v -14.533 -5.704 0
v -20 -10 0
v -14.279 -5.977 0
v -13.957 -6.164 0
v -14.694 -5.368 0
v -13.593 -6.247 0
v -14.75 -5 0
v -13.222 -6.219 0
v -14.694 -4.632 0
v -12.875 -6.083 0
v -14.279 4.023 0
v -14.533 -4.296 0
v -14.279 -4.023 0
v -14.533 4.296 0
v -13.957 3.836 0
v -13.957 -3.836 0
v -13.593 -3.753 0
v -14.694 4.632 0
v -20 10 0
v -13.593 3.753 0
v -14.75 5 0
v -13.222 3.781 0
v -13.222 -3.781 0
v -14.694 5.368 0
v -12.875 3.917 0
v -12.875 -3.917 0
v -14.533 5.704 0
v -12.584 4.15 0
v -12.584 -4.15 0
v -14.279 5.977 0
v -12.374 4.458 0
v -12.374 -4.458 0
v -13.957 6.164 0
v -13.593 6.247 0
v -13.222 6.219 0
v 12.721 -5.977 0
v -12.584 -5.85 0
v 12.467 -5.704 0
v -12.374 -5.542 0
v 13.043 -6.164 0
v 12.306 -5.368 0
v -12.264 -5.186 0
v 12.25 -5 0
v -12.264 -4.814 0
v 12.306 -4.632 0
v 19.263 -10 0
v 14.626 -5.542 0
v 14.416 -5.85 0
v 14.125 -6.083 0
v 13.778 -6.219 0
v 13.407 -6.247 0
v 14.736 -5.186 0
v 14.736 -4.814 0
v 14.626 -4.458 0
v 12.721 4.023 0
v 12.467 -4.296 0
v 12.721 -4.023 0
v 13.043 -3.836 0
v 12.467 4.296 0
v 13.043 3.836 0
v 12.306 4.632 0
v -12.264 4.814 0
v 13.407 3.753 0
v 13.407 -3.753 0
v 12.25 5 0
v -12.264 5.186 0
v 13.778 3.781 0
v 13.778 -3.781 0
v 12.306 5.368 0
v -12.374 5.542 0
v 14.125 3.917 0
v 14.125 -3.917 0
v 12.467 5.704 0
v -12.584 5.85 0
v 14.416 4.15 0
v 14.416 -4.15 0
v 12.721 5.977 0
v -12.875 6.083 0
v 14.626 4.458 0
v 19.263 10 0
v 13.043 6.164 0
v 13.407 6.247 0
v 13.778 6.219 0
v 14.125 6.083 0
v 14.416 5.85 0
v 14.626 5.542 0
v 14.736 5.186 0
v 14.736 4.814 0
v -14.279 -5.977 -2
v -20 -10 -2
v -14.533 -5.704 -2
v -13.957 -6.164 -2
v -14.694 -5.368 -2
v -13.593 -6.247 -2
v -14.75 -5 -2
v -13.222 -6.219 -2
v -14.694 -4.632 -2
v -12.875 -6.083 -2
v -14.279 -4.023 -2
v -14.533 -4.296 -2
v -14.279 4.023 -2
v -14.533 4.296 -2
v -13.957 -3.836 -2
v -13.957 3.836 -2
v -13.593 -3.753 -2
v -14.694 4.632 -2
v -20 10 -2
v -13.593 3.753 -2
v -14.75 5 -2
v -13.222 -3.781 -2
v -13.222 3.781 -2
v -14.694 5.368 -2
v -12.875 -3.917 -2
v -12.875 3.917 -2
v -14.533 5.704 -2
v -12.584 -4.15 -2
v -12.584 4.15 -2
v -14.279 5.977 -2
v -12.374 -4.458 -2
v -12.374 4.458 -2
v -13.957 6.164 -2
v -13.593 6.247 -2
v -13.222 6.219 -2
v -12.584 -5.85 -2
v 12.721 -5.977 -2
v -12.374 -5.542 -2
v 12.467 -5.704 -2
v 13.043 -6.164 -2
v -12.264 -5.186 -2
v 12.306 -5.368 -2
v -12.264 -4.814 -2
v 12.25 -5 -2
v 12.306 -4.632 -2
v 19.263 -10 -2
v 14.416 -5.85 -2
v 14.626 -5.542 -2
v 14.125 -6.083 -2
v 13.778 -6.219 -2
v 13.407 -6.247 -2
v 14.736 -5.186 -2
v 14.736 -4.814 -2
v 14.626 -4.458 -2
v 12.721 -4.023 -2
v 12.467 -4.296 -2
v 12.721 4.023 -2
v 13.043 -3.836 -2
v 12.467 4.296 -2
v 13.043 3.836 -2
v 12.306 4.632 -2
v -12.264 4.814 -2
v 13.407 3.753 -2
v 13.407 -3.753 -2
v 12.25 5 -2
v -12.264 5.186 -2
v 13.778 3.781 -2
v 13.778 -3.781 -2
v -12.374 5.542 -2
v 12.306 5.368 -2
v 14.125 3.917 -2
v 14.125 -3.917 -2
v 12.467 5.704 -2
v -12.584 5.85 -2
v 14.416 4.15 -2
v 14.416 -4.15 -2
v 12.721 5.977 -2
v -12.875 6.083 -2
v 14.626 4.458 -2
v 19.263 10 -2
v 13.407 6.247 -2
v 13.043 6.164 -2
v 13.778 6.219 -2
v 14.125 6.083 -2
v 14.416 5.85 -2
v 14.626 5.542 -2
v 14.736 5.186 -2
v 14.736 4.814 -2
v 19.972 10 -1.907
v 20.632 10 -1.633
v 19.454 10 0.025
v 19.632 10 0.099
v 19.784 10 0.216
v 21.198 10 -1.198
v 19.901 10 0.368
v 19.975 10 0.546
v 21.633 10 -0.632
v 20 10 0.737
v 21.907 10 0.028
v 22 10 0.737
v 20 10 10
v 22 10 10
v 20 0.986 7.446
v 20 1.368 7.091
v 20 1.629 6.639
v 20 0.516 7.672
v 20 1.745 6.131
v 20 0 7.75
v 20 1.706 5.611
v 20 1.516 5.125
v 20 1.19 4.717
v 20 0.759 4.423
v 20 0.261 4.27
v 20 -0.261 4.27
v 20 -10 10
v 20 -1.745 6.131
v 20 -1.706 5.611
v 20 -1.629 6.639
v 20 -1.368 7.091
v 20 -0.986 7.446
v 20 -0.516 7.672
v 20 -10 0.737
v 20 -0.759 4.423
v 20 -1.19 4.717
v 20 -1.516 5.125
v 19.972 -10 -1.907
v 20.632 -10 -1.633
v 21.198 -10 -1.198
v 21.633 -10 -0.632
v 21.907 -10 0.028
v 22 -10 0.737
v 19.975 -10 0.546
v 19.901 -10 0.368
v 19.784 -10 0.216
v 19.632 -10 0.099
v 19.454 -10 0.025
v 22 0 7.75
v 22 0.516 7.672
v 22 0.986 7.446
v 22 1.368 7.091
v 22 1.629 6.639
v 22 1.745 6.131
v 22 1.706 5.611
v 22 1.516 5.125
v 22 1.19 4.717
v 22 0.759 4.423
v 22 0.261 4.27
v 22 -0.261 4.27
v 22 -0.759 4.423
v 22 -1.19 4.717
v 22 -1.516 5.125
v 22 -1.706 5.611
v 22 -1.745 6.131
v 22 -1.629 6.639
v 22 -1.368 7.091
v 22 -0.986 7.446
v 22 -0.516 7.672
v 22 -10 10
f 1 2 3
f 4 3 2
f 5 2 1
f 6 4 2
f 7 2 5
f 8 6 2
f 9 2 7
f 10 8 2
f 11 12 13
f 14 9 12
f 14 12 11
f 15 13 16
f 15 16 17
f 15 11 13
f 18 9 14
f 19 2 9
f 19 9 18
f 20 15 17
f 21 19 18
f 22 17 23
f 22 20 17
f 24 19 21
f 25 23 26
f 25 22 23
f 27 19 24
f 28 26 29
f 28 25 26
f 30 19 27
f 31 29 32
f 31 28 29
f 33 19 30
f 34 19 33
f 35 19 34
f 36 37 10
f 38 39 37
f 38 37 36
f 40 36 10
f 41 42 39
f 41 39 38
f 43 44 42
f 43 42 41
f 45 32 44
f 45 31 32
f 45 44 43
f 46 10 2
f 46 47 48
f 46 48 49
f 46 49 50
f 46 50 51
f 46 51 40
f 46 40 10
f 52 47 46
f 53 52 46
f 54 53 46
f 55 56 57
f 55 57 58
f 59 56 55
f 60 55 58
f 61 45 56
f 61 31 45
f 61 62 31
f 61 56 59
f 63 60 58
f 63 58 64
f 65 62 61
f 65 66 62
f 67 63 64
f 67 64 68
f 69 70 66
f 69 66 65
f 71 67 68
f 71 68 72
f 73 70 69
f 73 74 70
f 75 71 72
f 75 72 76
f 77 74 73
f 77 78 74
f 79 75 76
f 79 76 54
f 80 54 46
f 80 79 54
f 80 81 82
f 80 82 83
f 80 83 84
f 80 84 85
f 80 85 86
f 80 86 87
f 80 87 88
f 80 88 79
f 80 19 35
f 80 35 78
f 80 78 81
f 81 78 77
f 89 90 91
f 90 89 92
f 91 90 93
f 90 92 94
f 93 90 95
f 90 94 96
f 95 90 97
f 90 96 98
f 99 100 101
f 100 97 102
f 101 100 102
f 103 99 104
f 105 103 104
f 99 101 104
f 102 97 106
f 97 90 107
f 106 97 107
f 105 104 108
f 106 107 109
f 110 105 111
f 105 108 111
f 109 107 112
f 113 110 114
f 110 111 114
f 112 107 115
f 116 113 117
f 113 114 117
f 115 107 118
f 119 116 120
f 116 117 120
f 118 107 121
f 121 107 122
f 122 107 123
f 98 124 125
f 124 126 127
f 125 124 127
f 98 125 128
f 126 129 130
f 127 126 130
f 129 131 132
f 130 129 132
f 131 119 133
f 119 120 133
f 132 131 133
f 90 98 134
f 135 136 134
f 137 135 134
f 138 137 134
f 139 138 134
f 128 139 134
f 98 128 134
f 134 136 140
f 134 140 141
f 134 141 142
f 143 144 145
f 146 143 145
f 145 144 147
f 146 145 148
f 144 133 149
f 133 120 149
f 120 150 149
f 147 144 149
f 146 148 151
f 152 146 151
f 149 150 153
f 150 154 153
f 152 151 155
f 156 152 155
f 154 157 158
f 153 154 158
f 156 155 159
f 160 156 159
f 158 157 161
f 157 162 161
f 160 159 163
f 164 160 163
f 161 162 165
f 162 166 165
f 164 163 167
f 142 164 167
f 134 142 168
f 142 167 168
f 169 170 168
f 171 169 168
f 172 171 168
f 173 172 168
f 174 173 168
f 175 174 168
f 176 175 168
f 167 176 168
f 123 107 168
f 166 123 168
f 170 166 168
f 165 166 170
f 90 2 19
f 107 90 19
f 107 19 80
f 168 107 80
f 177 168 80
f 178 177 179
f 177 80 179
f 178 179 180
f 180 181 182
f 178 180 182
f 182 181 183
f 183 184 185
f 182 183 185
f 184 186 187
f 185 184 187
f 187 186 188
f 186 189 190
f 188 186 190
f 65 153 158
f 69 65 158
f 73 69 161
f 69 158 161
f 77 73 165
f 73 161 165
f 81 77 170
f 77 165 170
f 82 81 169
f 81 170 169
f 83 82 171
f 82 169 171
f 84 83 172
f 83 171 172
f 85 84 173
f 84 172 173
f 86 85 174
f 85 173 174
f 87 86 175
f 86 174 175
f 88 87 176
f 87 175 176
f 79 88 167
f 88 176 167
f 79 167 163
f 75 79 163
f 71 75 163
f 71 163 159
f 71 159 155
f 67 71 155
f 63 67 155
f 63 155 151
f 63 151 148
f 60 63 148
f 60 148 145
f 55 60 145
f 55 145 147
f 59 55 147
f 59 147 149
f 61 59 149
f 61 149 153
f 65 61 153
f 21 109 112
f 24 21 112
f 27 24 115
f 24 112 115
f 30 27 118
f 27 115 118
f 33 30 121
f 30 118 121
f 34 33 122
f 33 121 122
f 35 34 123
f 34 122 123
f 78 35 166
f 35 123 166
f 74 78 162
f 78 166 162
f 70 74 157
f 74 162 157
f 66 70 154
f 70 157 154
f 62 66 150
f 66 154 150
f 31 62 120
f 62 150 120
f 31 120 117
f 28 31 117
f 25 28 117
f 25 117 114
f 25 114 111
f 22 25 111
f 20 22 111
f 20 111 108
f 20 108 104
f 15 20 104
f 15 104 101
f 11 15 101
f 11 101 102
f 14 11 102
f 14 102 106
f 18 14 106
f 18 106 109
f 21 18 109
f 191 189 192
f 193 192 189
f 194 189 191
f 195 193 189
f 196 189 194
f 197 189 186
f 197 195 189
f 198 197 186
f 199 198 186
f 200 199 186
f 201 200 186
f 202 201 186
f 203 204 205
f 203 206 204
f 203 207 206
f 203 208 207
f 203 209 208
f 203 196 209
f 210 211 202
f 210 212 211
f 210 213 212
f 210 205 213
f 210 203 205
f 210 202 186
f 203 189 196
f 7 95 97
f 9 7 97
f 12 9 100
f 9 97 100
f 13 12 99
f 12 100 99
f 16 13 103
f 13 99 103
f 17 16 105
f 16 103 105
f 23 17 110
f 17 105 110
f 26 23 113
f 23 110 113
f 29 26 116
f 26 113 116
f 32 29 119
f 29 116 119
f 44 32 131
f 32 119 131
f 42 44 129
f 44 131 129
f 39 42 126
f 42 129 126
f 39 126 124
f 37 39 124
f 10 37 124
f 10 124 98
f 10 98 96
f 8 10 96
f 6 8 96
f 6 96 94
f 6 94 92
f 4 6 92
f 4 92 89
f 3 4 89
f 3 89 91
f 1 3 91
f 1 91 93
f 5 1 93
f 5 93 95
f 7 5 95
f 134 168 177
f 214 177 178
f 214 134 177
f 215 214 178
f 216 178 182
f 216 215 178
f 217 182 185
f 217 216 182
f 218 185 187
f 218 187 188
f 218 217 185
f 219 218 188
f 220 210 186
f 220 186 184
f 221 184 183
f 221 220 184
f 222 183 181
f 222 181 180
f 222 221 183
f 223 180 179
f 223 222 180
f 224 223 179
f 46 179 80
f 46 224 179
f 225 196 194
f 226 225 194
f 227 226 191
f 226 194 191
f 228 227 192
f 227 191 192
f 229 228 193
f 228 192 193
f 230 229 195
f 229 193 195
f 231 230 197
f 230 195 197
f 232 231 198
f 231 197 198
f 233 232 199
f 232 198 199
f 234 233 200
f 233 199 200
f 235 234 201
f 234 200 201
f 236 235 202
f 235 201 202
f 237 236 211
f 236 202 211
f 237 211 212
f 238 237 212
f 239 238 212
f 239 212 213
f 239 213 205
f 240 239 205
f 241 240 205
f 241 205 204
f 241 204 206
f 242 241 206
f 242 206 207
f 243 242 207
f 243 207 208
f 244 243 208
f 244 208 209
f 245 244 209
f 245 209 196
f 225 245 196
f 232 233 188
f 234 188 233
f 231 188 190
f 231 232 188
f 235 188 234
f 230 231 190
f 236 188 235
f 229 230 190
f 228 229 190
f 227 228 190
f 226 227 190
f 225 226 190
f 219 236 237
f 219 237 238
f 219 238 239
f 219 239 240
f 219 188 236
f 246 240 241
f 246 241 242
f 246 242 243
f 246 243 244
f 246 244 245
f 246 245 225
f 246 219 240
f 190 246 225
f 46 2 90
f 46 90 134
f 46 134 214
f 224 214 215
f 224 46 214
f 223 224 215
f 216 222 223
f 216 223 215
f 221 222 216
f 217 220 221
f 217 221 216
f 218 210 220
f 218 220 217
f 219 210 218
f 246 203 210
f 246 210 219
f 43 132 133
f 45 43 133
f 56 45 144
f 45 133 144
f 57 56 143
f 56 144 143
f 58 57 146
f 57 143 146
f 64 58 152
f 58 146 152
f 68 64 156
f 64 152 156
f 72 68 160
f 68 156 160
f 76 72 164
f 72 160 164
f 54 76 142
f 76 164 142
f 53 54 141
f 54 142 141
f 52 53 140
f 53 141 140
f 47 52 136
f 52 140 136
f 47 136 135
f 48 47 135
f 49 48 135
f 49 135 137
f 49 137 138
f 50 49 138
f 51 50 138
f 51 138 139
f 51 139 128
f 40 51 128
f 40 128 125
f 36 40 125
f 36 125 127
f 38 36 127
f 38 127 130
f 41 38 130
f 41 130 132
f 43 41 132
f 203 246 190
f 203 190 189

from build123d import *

# Parameters (mm, degrees)
SKETCH_1_W                       = 40
SKETCH_1_H                       = 20
SM_BASE_FLANGE_1_DEPTH           = 2
SM_EDGE_FLANGE_1_STRIP_W         = 9.4732
SM_EDGE_FLANGE_1_STRIP_H         = 2
SM_EDGE_FLANGE_1_STRIP_CUT_DEPTH = 20
SM_EDGE_FLANGE_1_DEPTH           = 20
HOLE_WIZARD_M3_2_D               = 2.5
HOLE_WIZARD_3_5_3_5_2_D          = 3.5


# Sheet-metal steps are written as plain solids
with BuildPart() as part:
    # Sketch 1 → 基材-凸緣1 (new body)
    with BuildSketch(Plane.XY):
        Rectangle(SKETCH_1_W, SKETCH_1_H)
    extrude(amount=-SM_BASE_FLANGE_1_DEPTH)

    # 邊線-凸緣1 strip (across the edge) → 邊線-凸緣1 strip cut (cut)
    with BuildSketch(Plane(origin=(20, -10, 0), x_dir=(-1, 0, 0), z_dir=(0, 1, 0))):
        with Locations((-4, -1)):
            Rectangle(SM_EDGE_FLANGE_1_STRIP_W, SM_EDGE_FLANGE_1_STRIP_H)
    extrude(amount=SM_EDGE_FLANGE_1_STRIP_CUT_DEPTH, mode=Mode.SUBTRACT)

    # 邊線-凸緣1 section (across the edge) → 邊線-凸緣1 (add)
    with BuildSketch(Plane(origin=(20, -10, 0), x_dir=(-1, 0, 0), z_dir=(0, 1, 0))):
        with BuildLine():
            Line((-2, 0.7366), (-2, 10))
            Line((-2, 10), (0, 10))
            Line((0, 10), (0, 0.7366))
            ThreePointArc((0, 0.7366), (0.215745145, 0.215745145), (0.7366, 0))
            Line((0.7366, 0), (0.7366, -2))
            ThreePointArc((0.7366, -2), (-1.198468417, -1.198468417), (-2, 0.7366))
        make_face()
    extrude(amount=SM_EDGE_FLANGE_1_DEPTH)

    # M3 螺紋孔2 (through all)
    with Locations(Plane.XY):
        with Locations((-13.5, -5), (13.5, -5), (13.5, 5), (-13.5, 5)):
            Hole(HOLE_WIZARD_M3_2_D / 2)

    # Ø3.5 (3.5) 直徑孔2 (through all)
    with Locations(Plane(origin=(22, 0, 0), x_dir=(0, 0, -1), z_dir=(1, 0, 0))):
        with Locations((-6, 0)):
            Hole(HOLE_WIZARD_3_5_3_5_2_D / 2)


solid = part.part
